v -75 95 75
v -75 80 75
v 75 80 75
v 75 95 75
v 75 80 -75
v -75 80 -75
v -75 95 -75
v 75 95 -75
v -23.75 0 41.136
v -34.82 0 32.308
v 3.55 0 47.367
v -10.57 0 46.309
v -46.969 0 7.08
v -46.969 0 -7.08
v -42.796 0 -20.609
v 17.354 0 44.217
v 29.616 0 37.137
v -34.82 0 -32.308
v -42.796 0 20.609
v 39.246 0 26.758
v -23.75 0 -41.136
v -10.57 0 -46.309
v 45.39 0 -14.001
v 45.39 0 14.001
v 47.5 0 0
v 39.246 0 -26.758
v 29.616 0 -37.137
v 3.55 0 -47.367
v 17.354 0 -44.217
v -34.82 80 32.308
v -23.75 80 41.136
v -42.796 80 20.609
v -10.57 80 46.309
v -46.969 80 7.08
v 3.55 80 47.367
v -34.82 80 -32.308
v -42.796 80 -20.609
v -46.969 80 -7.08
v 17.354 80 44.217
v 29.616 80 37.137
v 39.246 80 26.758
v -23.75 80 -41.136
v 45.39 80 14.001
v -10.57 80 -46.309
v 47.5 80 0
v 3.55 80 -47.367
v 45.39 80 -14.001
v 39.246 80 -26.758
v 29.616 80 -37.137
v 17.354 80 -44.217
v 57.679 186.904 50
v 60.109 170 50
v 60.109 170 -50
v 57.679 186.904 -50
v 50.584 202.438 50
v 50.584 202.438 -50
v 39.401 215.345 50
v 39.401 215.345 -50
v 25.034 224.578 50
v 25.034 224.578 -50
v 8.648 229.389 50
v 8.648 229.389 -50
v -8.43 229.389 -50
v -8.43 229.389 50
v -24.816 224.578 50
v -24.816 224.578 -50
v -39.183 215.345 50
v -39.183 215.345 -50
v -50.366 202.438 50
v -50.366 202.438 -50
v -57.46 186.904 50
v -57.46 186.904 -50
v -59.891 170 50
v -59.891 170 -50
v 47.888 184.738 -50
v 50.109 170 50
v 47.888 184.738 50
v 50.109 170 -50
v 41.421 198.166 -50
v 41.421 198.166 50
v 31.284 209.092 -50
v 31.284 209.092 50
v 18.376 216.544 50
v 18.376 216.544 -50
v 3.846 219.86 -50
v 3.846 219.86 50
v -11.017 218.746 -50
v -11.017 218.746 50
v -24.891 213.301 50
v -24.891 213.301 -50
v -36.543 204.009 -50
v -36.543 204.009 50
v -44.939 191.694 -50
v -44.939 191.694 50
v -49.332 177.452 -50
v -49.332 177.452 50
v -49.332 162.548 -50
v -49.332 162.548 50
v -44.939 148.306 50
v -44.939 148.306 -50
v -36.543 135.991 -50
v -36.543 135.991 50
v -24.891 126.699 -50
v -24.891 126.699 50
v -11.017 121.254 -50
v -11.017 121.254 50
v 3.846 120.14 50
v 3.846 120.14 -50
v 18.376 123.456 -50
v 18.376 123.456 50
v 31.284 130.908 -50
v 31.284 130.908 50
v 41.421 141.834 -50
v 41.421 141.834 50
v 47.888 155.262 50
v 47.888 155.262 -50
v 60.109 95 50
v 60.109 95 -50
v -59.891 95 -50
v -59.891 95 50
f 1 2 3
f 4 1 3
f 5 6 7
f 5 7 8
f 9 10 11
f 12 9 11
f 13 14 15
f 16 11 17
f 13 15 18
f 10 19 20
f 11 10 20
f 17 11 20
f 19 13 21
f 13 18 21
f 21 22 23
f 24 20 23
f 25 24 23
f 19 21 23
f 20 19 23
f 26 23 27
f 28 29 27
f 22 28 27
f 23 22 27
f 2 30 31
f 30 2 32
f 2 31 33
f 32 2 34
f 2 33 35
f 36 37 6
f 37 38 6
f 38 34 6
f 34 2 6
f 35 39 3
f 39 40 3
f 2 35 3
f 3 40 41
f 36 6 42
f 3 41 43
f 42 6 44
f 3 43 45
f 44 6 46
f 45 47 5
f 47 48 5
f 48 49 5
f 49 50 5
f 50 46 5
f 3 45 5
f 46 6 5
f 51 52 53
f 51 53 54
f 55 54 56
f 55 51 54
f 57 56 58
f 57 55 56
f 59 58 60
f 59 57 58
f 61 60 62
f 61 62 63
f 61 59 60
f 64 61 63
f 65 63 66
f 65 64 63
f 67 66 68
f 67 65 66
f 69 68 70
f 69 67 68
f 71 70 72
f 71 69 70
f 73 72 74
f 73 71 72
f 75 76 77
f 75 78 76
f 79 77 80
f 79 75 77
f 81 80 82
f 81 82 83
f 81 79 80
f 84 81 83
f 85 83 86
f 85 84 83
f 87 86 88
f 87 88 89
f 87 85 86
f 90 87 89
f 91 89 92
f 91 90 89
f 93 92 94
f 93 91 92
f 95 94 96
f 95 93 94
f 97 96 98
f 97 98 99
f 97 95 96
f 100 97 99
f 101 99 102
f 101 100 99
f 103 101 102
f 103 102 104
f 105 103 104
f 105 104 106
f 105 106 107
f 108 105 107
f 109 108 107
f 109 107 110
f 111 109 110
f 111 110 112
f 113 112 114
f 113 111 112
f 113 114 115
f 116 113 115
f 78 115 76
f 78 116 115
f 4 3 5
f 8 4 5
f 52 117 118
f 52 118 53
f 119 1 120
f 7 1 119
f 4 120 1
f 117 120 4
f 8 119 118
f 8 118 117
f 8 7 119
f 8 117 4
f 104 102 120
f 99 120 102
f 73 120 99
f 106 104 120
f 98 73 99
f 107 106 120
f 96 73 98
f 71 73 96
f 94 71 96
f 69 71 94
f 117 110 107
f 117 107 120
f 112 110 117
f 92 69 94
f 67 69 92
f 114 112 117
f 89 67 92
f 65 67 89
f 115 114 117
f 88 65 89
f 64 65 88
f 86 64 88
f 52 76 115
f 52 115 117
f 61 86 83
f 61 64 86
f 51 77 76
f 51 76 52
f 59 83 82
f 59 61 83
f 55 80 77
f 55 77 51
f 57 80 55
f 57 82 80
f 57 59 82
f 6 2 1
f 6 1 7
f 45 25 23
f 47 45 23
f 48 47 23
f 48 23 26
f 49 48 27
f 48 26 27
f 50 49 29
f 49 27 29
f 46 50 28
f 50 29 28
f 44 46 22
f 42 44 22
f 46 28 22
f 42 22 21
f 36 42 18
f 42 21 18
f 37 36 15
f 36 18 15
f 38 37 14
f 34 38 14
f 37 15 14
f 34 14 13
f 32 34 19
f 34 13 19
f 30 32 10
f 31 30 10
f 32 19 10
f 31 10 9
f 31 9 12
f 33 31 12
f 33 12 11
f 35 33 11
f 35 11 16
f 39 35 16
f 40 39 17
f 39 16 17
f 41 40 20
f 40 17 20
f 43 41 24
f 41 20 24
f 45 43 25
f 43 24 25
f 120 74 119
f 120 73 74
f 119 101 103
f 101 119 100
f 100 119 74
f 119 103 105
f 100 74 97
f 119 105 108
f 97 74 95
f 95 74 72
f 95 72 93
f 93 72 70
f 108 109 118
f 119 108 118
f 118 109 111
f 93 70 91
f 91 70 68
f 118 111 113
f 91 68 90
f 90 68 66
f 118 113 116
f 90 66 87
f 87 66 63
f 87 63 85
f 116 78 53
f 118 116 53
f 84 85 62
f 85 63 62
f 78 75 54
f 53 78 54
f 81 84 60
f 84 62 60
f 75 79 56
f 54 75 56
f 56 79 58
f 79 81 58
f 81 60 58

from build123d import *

# Parameters (mm, degrees)
SKETCH1_R           = 47.5
BOSS_EXTRUDE1_DEPTH = 80
SKETCH6_W           = 150
SKETCH6_H           = 150
BOSS_EXTRUDE3_DEPTH = 15
SKETCH7_R           = 50
BOSS_EXTRUDE4_DEPTH = 50


with BuildPart() as part:
    # Sketch1 → Boss-Extrude1 (new body)
    with BuildSketch(Plane(origin=(0, 0, 0), x_dir=(1, 0, 0), z_dir=(0, 1, 0))):
        Circle(SKETCH1_R)
    extrude(amount=BOSS_EXTRUDE1_DEPTH)

    # Sketch6 → Boss-Extrude3 (add)
    with BuildSketch(Plane(origin=(0, 80, 0), x_dir=(1, 0, 0), z_dir=(0, 1, 0))):
        Rectangle(SKETCH6_W, SKETCH6_H)
    extrude(amount=BOSS_EXTRUDE3_DEPTH)

    # Sketch7 → Boss-Extrude4 (add, symmetric)
    with BuildSketch(Plane.XY):
        with BuildLine():
            Line((-59.89087621, 95), (60.10912379, 95))
            Line((60.10912379, 95), (60.10912379, 170))
            ThreePointArc((60.10912379, 170), (0.10912379, 230), (-59.89087621, 170))
            Line((-59.89087621, 170), (-59.89087621, 95))
        make_face()
        with Locations((0.10912379, 170)):
            Circle(SKETCH7_R, mode=Mode.SUBTRACT)
    extrude(amount=BOSS_EXTRUDE4_DEPTH, both=True)


solid = part.part
